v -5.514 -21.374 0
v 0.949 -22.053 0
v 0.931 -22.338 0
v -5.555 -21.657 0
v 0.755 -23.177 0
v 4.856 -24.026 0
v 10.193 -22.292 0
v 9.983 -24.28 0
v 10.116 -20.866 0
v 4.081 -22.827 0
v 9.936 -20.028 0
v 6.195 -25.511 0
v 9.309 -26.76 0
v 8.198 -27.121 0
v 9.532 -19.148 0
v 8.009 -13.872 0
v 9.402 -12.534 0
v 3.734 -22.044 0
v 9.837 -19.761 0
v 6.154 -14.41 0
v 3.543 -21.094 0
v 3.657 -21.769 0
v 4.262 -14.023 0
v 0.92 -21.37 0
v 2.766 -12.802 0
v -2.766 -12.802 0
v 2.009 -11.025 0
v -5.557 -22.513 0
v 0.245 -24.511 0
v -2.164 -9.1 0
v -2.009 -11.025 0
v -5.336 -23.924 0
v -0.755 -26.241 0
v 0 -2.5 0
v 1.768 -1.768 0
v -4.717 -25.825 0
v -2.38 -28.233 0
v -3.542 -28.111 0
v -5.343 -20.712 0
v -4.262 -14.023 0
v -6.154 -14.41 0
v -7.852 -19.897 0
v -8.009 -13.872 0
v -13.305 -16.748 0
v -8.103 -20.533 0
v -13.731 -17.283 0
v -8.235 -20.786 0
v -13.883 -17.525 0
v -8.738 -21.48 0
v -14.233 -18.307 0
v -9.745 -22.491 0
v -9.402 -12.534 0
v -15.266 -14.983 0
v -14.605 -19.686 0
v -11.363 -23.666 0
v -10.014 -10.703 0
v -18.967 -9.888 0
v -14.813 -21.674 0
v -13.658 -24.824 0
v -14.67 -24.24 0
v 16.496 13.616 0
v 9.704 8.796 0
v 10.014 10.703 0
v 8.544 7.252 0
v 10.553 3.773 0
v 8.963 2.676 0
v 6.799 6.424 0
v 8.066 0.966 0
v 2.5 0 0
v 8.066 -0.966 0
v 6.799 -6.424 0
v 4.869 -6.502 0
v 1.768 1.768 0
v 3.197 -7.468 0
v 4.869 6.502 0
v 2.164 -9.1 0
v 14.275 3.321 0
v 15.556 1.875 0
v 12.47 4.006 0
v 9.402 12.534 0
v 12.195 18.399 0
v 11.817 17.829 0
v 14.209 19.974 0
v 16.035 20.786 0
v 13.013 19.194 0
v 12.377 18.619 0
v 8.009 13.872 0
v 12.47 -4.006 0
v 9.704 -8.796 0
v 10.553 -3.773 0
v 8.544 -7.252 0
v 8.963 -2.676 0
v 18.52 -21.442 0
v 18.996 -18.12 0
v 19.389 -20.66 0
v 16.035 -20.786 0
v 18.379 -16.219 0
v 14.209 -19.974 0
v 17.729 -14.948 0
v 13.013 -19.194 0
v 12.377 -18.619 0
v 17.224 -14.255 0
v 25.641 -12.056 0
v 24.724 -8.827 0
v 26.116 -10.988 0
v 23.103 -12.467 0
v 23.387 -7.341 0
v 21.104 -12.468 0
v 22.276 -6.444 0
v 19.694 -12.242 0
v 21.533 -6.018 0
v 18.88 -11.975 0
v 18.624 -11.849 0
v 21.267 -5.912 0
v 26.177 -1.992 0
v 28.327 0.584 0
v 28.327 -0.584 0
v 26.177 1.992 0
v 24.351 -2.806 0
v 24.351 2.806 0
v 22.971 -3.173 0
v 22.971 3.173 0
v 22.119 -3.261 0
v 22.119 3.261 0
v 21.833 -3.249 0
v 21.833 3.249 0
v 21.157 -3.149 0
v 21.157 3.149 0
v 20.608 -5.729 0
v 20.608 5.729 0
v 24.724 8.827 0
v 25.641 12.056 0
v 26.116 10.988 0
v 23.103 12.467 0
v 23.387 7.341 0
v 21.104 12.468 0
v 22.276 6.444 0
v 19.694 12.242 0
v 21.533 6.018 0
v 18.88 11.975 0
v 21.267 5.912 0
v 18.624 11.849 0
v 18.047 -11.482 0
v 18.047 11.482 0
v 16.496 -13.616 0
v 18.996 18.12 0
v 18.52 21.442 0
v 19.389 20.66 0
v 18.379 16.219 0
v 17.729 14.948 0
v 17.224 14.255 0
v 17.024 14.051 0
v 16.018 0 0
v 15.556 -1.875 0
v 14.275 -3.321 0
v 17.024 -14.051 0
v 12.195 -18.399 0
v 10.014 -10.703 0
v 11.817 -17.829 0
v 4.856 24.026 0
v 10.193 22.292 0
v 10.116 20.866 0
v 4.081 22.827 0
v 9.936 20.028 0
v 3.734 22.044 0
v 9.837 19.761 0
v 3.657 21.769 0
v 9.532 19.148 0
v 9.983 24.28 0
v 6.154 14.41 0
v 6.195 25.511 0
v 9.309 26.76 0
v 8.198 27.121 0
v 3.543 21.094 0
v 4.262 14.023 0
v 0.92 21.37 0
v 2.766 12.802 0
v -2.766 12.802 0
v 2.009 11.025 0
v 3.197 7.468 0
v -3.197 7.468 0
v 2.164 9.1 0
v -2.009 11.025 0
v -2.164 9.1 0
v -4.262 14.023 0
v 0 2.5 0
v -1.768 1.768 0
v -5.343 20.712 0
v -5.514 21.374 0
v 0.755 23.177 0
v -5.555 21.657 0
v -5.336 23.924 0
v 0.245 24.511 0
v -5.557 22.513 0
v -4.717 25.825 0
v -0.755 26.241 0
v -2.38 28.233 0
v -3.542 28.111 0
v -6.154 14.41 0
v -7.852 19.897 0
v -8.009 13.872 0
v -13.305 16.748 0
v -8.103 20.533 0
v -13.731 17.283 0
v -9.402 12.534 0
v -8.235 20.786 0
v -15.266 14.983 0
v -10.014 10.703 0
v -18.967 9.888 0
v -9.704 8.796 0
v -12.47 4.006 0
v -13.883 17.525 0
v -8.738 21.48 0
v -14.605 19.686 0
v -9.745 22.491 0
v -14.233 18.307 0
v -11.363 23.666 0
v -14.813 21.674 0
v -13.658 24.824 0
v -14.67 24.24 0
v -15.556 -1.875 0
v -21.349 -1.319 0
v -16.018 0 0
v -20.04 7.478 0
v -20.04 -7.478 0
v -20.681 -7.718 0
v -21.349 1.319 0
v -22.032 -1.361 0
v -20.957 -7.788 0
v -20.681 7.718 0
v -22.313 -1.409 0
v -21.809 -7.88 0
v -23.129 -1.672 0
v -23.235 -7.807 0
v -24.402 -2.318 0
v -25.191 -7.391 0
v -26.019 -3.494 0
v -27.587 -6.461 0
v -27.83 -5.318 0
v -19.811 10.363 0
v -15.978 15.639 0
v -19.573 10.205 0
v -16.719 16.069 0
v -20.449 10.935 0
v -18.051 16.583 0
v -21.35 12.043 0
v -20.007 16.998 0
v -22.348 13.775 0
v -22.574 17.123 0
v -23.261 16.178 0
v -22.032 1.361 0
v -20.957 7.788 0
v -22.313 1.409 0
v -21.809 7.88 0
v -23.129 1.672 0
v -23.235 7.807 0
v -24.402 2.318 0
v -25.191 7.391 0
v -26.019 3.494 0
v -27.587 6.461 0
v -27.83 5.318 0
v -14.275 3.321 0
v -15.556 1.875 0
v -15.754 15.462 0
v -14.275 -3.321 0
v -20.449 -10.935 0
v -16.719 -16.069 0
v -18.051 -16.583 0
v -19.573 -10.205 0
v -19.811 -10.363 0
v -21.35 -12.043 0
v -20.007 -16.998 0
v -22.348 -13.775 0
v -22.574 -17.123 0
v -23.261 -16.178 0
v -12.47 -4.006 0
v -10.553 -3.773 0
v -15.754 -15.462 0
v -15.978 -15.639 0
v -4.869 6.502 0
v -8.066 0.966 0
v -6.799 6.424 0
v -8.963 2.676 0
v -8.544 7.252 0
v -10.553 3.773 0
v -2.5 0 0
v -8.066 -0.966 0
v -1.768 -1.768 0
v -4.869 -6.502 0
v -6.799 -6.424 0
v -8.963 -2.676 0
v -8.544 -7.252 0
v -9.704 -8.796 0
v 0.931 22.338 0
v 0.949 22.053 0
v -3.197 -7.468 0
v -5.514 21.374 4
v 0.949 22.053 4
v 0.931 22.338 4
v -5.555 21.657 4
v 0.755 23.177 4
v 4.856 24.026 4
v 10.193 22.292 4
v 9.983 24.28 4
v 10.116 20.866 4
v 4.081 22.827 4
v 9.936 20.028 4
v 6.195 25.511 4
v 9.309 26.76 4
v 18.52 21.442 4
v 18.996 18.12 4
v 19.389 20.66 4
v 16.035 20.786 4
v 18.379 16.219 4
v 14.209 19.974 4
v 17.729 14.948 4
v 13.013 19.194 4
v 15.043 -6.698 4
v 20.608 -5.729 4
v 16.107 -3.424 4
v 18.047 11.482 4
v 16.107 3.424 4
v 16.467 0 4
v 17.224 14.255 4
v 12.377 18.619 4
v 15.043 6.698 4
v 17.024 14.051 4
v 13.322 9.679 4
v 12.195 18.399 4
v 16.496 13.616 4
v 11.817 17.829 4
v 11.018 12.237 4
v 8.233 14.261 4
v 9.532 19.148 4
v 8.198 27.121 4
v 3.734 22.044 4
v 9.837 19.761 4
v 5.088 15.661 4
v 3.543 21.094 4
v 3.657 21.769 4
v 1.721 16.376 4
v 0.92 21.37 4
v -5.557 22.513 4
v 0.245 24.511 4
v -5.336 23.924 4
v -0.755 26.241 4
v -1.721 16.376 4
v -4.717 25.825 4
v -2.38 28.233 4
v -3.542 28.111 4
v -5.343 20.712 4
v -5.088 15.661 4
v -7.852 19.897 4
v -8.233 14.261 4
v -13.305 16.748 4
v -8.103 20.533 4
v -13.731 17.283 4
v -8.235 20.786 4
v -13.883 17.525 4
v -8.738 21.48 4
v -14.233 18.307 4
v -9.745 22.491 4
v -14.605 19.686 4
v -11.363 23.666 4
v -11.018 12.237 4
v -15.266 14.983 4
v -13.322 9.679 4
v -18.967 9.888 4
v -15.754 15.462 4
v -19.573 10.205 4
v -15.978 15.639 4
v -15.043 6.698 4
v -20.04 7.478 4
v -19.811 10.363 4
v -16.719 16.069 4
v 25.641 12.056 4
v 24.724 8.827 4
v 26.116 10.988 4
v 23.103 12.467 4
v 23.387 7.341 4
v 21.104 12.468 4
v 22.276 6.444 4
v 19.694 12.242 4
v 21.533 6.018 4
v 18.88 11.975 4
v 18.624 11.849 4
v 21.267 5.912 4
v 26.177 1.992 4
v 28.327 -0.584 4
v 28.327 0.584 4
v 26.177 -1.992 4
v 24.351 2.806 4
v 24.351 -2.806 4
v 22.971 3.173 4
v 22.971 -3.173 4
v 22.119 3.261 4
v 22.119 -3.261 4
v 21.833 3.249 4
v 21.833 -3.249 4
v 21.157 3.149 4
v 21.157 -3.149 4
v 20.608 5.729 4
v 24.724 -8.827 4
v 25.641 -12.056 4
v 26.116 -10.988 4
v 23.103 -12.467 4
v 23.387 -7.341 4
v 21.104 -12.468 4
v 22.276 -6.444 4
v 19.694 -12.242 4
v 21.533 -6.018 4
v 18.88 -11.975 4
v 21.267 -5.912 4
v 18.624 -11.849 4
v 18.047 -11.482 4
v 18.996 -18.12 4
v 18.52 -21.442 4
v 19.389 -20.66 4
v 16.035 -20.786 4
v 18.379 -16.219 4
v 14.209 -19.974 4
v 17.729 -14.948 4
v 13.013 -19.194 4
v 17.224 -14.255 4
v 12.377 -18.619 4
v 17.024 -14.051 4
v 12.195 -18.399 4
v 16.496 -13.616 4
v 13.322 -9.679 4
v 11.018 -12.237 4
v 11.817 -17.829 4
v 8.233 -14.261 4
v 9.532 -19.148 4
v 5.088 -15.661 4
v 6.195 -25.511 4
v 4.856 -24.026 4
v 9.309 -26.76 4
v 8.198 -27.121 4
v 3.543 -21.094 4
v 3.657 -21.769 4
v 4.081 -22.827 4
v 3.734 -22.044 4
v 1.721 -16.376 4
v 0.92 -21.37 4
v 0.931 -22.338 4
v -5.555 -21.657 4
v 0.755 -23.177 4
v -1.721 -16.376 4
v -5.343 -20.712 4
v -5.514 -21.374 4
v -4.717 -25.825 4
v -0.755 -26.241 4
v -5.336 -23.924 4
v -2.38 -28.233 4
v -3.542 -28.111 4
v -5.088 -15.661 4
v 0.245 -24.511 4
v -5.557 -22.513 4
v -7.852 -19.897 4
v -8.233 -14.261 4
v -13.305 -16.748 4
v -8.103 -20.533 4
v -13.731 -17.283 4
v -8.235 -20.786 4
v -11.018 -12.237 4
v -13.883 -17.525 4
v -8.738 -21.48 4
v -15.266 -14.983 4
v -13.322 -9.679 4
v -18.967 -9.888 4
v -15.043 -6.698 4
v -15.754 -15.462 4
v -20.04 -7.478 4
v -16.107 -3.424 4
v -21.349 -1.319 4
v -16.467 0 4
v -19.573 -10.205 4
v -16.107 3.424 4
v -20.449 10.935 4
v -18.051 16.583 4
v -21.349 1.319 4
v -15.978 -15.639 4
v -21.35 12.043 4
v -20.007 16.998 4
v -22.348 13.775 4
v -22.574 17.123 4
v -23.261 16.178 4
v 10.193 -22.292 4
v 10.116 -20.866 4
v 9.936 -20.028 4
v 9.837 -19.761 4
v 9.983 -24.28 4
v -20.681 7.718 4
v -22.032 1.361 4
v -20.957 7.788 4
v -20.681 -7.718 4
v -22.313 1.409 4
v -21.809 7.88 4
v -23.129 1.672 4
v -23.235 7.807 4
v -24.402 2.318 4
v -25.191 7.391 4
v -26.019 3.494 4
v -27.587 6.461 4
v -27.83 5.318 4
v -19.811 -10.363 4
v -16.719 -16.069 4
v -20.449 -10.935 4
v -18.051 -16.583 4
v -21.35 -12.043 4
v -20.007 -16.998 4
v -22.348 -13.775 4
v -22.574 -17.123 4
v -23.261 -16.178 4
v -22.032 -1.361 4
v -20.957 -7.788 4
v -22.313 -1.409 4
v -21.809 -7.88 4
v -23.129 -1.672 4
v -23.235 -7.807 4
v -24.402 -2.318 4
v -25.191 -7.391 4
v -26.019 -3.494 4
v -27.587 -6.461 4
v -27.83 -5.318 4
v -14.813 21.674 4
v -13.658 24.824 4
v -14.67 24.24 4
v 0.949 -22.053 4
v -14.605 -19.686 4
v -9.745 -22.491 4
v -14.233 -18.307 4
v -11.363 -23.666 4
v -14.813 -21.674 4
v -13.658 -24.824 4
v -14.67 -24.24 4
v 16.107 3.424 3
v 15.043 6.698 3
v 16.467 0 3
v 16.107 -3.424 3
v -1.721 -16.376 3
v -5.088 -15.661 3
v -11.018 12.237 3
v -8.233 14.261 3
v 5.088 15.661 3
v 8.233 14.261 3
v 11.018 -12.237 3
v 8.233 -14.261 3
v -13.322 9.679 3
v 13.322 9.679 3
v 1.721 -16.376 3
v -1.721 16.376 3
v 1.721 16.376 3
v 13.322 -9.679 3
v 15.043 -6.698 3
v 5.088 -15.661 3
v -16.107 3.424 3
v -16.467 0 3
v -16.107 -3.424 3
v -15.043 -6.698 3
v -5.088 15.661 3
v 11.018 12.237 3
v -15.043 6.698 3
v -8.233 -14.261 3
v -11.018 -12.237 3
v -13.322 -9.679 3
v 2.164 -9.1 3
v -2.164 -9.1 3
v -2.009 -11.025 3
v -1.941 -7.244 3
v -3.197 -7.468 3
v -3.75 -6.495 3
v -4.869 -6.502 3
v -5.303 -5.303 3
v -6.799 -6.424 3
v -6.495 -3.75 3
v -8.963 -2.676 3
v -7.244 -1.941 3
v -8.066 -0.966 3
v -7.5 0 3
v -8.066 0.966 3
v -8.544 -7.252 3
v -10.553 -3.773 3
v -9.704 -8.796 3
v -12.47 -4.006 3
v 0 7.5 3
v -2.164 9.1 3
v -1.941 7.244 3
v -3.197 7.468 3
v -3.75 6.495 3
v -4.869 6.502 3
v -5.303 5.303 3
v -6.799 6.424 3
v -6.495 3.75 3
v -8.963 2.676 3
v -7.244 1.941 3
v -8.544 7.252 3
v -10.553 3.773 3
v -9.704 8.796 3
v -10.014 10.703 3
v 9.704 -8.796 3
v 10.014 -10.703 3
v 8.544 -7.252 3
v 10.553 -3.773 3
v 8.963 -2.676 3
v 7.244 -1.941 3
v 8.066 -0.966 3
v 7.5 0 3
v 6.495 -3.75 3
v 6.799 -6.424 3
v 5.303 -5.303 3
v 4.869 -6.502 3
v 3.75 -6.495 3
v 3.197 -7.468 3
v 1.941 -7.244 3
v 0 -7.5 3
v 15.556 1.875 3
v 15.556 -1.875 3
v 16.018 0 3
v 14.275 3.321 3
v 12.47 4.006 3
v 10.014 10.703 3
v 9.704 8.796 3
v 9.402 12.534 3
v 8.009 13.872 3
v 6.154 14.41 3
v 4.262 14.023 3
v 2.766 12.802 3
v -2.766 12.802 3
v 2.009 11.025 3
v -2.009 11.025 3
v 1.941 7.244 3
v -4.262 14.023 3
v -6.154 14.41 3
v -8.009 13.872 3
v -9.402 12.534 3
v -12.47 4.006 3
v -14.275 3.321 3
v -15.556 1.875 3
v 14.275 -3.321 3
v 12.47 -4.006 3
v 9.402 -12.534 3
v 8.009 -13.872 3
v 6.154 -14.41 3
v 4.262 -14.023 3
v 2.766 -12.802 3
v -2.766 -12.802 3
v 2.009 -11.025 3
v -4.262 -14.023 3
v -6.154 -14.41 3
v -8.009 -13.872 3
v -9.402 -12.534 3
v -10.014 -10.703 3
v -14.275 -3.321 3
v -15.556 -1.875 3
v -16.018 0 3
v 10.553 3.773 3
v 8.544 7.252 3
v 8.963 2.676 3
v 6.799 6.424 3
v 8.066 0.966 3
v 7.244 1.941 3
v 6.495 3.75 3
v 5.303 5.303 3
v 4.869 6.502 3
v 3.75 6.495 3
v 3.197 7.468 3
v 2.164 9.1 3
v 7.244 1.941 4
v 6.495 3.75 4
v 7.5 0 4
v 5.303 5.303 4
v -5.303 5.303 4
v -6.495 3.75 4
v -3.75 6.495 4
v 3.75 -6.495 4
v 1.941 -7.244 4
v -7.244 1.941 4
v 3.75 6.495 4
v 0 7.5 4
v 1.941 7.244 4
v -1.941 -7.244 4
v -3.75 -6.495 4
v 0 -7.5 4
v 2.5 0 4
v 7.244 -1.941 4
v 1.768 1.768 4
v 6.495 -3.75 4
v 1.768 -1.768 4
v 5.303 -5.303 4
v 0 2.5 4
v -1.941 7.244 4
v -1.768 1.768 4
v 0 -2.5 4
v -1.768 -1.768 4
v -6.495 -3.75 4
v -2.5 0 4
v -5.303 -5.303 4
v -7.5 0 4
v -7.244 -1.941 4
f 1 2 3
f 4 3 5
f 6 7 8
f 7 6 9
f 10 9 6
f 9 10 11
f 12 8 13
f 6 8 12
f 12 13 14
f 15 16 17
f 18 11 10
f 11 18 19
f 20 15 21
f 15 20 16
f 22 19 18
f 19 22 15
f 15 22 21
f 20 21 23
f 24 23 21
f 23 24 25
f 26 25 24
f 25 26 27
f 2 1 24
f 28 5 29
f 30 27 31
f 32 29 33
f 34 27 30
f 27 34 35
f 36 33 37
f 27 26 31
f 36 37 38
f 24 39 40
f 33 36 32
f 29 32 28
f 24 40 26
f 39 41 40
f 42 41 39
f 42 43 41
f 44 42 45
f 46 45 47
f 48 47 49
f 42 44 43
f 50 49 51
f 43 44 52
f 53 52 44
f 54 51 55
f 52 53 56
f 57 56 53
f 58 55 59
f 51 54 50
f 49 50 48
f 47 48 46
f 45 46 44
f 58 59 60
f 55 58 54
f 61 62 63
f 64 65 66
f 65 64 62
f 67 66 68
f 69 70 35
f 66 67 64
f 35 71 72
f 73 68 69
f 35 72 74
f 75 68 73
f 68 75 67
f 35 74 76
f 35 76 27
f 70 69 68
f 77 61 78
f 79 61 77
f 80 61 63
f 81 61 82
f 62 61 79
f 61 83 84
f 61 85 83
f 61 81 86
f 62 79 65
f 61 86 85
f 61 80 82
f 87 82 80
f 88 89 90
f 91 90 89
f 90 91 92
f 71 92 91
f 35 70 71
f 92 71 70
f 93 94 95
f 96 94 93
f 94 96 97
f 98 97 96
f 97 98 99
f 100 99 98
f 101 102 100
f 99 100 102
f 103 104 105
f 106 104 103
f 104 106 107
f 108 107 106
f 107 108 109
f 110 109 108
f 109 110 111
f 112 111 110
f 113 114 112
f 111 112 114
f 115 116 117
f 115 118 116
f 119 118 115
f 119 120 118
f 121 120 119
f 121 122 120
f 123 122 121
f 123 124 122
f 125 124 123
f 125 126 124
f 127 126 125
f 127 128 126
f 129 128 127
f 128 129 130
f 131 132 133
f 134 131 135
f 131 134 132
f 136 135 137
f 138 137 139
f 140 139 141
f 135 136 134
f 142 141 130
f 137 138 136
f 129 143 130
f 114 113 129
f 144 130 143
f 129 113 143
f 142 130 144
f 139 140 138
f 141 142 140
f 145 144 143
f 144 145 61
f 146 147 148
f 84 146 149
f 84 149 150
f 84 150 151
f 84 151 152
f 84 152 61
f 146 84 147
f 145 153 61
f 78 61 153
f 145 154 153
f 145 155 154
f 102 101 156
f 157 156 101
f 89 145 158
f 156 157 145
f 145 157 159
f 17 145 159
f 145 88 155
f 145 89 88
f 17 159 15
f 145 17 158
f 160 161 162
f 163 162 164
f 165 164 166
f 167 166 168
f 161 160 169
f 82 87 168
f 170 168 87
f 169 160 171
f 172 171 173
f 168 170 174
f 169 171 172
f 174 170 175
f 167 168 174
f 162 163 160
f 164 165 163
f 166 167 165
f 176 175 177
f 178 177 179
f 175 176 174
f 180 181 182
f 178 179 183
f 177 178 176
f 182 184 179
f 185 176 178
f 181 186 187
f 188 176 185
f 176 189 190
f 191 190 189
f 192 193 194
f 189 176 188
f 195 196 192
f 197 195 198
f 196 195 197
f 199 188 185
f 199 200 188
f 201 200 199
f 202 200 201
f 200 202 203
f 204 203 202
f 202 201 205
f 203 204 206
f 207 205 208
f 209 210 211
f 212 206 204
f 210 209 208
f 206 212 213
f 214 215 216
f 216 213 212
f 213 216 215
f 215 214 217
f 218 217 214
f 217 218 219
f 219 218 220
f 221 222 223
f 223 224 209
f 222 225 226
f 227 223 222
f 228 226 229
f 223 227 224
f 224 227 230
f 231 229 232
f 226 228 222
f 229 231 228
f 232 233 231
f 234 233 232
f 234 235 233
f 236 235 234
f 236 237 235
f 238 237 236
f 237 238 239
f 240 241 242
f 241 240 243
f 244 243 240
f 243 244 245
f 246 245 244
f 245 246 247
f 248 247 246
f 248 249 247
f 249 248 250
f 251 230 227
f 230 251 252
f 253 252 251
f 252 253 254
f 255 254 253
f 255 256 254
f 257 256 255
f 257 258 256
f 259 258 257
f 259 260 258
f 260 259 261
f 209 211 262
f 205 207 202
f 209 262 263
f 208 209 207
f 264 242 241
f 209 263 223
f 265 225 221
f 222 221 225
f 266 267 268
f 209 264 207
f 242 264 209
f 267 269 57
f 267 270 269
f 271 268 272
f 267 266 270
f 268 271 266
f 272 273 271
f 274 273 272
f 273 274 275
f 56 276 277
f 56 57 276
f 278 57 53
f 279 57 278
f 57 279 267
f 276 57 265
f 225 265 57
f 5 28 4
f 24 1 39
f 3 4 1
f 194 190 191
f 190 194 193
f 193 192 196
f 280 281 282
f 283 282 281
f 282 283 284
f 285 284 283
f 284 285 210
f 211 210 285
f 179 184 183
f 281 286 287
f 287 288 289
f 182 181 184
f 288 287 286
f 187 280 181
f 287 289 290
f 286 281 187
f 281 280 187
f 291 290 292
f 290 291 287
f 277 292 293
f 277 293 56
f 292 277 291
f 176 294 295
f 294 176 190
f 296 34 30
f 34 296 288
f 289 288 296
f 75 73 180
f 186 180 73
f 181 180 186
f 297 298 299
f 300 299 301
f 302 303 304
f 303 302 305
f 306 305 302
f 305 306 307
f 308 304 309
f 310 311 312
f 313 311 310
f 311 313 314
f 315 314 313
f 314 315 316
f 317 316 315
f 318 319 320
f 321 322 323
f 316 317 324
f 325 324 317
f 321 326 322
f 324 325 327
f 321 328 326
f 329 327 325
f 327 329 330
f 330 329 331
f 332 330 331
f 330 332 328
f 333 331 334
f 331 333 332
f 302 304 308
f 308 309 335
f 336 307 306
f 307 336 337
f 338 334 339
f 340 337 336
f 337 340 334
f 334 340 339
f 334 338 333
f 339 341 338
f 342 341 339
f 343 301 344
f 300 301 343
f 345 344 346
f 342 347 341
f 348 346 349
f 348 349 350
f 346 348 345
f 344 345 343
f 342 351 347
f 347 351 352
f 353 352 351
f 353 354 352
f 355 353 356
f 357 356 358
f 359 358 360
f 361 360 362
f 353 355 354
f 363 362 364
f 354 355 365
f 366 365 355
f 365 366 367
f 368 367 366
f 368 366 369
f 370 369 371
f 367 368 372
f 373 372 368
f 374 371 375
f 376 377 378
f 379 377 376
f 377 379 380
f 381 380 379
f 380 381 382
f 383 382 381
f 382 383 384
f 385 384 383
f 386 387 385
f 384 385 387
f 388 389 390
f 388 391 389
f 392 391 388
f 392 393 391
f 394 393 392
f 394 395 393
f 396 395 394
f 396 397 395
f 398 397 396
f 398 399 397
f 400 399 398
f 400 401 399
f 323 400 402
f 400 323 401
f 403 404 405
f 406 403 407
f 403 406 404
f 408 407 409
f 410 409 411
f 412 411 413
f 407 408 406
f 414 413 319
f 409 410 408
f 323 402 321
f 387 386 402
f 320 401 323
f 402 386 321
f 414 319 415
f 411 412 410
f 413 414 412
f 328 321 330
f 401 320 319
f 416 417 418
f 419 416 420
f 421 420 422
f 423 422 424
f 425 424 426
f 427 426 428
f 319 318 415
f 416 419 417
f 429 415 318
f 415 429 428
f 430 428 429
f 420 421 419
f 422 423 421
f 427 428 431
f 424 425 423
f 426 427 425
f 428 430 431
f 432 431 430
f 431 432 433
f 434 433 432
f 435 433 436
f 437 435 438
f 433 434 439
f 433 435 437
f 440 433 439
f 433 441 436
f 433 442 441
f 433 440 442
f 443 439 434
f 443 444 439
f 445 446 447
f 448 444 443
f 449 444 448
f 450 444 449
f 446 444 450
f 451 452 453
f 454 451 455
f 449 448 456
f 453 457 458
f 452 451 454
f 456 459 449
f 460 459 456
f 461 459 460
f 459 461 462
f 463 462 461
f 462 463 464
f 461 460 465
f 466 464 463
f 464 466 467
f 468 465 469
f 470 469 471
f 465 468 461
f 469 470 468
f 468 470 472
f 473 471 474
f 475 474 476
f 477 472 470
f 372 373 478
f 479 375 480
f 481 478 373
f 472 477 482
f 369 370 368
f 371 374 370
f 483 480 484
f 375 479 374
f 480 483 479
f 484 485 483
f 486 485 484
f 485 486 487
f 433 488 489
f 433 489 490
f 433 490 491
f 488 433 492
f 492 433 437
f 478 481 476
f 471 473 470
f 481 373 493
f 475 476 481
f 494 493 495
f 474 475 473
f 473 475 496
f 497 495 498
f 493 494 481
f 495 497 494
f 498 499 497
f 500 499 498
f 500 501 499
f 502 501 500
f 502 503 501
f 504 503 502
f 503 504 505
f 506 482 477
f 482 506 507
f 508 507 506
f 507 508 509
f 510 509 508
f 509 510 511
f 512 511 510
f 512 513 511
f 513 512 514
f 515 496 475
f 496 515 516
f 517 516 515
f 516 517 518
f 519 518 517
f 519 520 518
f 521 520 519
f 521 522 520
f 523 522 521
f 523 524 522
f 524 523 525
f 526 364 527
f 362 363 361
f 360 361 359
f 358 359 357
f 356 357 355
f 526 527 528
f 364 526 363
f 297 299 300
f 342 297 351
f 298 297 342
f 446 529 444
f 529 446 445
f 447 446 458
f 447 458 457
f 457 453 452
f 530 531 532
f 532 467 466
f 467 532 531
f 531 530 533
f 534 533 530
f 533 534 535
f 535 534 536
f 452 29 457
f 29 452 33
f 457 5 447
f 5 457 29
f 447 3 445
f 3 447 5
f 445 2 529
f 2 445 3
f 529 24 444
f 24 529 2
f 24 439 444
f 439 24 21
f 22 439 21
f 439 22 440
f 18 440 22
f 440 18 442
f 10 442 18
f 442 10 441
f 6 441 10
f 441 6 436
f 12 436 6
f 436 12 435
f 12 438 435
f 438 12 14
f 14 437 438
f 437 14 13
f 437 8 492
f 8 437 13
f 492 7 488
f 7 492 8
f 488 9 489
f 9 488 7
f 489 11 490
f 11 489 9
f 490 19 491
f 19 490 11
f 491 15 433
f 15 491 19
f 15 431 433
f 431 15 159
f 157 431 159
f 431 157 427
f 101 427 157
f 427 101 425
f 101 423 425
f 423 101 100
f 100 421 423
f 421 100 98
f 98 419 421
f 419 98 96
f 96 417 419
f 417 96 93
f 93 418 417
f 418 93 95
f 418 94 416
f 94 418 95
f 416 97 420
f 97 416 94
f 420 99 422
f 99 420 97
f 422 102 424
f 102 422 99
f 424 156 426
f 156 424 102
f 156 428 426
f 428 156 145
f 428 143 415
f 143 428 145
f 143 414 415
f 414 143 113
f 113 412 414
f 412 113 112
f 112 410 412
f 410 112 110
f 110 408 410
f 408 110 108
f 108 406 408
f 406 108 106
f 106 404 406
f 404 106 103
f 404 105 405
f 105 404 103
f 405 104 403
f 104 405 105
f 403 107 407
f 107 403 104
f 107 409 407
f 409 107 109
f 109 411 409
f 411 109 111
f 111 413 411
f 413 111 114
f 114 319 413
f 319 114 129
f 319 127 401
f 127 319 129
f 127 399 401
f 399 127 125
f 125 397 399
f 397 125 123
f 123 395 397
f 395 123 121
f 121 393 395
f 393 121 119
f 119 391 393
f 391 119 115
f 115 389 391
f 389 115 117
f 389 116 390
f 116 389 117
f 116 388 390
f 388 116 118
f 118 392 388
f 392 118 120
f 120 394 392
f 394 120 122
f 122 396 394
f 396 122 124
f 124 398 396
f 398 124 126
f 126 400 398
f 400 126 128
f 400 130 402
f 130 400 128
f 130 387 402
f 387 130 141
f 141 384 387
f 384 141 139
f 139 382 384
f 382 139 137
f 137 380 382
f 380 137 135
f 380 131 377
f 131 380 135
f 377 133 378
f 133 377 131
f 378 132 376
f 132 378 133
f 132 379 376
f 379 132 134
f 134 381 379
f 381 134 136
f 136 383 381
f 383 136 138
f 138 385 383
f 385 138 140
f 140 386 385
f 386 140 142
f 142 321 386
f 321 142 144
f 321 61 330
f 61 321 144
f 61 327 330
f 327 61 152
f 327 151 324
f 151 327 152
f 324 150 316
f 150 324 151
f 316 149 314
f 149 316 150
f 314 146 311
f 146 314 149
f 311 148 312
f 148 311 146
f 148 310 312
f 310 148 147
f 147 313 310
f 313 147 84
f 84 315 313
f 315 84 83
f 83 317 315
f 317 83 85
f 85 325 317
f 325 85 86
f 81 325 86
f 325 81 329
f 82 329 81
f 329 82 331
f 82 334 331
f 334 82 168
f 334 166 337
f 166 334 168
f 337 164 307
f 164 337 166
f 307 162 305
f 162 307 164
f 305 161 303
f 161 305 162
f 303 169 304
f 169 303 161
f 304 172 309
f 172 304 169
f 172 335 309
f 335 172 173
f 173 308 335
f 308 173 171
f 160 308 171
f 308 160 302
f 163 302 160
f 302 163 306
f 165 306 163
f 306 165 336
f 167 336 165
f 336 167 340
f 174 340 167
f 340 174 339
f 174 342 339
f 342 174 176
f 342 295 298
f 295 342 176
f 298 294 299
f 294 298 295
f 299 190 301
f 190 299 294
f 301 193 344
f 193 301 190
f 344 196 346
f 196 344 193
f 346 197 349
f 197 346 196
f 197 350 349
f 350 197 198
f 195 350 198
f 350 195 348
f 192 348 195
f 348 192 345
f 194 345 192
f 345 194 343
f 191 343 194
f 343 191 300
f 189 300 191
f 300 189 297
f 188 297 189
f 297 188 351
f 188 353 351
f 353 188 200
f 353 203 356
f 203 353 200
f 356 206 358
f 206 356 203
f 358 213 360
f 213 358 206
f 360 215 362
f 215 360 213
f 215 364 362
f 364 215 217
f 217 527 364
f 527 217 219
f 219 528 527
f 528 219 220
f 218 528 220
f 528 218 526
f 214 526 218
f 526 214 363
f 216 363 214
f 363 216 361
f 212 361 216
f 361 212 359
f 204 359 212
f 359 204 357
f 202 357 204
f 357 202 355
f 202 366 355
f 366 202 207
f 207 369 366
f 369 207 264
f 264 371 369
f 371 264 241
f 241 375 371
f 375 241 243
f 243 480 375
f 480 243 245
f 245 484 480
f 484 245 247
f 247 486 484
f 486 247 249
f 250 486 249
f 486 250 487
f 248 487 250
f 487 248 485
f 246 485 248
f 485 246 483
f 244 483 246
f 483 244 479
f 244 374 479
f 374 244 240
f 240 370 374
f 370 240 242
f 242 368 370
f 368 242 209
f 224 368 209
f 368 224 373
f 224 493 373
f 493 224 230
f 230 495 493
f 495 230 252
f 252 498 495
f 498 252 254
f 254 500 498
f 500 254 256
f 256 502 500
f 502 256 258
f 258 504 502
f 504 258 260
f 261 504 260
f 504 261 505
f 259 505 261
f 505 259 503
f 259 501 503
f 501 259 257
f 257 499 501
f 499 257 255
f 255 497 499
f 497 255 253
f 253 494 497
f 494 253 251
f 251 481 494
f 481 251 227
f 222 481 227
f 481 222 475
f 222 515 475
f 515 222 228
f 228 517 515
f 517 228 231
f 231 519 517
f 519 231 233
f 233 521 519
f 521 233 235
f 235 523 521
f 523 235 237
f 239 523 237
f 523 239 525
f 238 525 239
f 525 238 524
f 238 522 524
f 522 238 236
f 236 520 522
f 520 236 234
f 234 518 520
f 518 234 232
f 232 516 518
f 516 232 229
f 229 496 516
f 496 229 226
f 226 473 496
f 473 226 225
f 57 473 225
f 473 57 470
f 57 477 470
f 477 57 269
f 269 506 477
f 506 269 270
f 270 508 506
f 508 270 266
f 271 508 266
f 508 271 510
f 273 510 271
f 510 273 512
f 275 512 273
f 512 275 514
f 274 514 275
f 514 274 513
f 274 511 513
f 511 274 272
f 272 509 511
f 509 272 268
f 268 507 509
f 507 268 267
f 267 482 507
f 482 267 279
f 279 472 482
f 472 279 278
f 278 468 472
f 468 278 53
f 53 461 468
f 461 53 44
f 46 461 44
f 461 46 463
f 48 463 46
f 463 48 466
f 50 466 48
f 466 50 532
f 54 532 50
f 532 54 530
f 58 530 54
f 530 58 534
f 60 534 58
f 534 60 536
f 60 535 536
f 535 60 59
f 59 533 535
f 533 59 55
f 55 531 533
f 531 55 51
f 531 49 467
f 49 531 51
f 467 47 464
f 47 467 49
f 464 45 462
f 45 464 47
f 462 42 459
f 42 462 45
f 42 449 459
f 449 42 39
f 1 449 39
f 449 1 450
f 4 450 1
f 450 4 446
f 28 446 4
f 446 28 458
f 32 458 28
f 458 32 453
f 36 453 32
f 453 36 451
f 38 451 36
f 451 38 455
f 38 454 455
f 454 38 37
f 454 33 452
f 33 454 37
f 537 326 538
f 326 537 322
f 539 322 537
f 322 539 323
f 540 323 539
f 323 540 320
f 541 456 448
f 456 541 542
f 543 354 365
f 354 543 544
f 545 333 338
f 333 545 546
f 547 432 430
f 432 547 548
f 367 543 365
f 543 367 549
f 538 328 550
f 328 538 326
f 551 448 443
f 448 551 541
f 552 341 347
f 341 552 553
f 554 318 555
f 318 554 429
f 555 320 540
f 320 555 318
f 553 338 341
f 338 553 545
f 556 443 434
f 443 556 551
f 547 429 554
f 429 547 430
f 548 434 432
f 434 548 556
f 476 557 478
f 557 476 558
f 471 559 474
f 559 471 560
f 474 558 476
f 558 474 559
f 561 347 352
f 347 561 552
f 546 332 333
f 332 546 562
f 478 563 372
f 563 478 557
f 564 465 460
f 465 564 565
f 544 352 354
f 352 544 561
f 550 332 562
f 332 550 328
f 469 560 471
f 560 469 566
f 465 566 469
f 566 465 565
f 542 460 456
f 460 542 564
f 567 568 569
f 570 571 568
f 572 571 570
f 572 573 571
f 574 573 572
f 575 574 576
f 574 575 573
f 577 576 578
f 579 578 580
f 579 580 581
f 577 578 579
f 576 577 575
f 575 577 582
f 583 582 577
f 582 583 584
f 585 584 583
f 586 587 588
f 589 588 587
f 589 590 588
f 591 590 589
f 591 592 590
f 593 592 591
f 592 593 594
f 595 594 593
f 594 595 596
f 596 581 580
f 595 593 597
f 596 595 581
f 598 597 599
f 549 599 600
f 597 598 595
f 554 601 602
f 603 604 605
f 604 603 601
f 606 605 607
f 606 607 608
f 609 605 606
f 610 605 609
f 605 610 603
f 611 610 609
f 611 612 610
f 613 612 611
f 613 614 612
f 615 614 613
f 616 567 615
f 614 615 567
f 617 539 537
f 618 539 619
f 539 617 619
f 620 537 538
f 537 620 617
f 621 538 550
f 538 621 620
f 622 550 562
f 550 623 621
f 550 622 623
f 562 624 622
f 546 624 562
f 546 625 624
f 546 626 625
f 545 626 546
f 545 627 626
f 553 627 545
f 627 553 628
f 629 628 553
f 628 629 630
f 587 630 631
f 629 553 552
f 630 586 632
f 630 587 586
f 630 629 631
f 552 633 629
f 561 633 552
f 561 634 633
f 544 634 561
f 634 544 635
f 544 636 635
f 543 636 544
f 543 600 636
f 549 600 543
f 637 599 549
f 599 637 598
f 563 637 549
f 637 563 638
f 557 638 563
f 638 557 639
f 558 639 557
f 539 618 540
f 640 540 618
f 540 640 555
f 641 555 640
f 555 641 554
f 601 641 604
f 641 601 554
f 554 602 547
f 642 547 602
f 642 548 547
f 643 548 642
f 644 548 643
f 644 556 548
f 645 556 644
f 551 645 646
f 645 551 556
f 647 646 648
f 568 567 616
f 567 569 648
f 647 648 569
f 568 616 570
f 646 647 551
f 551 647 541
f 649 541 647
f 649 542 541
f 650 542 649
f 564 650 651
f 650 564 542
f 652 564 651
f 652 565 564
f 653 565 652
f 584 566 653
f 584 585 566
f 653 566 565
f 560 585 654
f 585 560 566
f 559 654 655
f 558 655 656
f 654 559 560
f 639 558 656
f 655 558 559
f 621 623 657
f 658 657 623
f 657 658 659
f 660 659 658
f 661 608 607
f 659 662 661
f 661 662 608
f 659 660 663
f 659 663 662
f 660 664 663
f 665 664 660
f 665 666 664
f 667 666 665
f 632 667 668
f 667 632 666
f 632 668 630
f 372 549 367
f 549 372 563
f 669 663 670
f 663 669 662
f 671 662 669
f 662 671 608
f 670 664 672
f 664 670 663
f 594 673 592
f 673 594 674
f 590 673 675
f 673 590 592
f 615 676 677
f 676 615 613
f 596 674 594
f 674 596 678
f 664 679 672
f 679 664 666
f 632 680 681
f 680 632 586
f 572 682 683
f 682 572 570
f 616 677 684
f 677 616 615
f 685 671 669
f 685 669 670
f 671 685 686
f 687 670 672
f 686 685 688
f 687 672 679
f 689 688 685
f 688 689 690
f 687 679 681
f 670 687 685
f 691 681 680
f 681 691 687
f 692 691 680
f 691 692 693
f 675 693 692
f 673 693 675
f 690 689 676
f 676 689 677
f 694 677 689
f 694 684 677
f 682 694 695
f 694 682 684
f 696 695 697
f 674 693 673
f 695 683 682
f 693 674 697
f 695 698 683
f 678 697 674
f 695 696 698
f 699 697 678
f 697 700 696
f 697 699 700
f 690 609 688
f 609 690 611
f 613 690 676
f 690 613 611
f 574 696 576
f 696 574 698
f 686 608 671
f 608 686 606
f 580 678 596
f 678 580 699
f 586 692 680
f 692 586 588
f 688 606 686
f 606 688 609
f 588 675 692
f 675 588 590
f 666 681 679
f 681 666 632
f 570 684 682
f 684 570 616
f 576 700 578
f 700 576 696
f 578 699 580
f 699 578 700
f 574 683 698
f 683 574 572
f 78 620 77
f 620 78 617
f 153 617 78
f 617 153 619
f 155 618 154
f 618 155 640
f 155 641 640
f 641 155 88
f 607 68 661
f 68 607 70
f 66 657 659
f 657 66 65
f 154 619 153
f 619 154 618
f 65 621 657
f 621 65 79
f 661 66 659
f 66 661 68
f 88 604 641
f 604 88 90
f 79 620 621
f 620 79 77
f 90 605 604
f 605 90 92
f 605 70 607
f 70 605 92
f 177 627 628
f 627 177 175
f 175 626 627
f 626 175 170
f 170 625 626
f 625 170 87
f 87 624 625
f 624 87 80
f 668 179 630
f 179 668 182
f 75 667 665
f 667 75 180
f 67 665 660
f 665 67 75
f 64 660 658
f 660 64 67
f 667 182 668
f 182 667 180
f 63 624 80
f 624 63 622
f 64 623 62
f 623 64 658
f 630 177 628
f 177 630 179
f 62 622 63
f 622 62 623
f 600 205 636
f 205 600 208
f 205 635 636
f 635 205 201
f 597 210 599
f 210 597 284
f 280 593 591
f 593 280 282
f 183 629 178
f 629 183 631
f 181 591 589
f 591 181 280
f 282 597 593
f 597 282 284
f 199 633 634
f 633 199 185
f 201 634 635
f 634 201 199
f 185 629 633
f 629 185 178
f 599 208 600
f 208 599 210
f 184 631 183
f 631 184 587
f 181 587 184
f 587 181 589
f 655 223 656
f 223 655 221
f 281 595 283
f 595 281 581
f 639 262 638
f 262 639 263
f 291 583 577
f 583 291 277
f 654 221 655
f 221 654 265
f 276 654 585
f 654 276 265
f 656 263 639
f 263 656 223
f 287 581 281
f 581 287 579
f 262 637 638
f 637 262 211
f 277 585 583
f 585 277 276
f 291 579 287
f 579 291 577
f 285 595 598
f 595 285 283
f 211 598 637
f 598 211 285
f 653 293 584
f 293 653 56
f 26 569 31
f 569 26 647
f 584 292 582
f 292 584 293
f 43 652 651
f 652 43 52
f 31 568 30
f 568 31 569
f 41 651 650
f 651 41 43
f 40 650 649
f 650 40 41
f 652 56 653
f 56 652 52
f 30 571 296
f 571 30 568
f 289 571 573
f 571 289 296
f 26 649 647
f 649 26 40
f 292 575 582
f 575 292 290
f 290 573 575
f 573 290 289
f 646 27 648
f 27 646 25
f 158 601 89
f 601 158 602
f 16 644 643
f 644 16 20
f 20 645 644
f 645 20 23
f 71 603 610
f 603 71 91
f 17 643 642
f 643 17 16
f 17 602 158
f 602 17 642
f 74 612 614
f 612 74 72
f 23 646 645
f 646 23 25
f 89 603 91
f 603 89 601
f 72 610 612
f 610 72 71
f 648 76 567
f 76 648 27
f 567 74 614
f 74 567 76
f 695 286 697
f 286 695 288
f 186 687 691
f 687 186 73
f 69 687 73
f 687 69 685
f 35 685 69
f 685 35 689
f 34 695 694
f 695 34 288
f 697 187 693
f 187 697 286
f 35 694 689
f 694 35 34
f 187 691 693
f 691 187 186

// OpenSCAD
// Parametric Involute Bevel and Spur Gears by GregFrost
// It is licensed under the Creative Commons - GNU GPL license.
// © 2010 by GregFrost
// http://www.thingiverse.com/thing:3575

// Simple Test:
gear (circular_pitch=600,
	gear_thickness = 3,
	rim_thickness = 4,
	hub_thickness = 4,
	circles=6);

//Complex Spur Gear Test:
//test_gears ();

// Meshing Double Helix:
//meshing_double_helix ();

// Demonstrate the backlash option for Spur gears.
//test_backlash ();

// Demonstrate how to make meshing bevel gears.
//bevel_gear_pair ();

pi=3.1415926535897932384626433832795;

//==================================================
// Bevel Gears:
// Two gears with the same cone distance, circular pitch (measured at the cone distance) 
// and pressure angle will mesh.

module bevel_gear_pair (
	gear1_teeth = 41,
	gear2_teeth = 7,
	axis_angle = 90,
	outside_circular_pitch=1000)
{
	outside_pitch_radius1 = gear1_teeth * outside_circular_pitch / 360;
	outside_pitch_radius2 = gear2_teeth * outside_circular_pitch / 360;
	pitch_apex1=outside_pitch_radius2 * sin (axis_angle) + 
		(outside_pitch_radius2 * cos (axis_angle) + outside_pitch_radius1) / tan (axis_angle);
	cone_distance = sqrt (pow (pitch_apex1, 2) + pow (outside_pitch_radius1, 2));
	pitch_apex2 = sqrt (pow (cone_distance, 2) - pow (outside_pitch_radius2, 2));
	echo ("cone_distance", cone_distance);
	pitch_angle1 = asin (outside_pitch_radius1 / cone_distance);
	pitch_angle2 = asin (outside_pitch_radius2 / cone_distance);
	echo ("pitch_angle1, pitch_angle2", pitch_angle1, pitch_angle2);
	echo ("pitch_angle1 + pitch_angle2", pitch_angle1 + pitch_angle2);

	rotate([0,0,90])
	translate ([0,0,pitch_apex1+20])
	{
		translate([0,0,-pitch_apex1])
		bevel_gear (
			number_of_teeth=gear1_teeth,
			cone_distance=cone_distance,
			pressure_angle=30,
			outside_circular_pitch=outside_circular_pitch);
	
		rotate([0,-(pitch_angle1+pitch_angle2),0])
		translate([0,0,-pitch_apex2])
		bevel_gear (
			number_of_teeth=gear2_teeth,
			cone_distance=cone_distance,
			pressure_angle=30,
			outside_circular_pitch=outside_circular_pitch);
	}
}

//Bevel Gear Finishing Options:
bevel_gear_flat = 0;
bevel_gear_back_cone = 1;

module bevel_gear (
	number_of_teeth=11,
	cone_distance=100,
	face_width=20,
	outside_circular_pitch=1000,
	pressure_angle=30,
	clearance = 0.2,
	bore_diameter=5,
	gear_thickness = 15,
	backlash = 0,
	involute_facets=0,
	finish = -1)
{
	echo ("bevel_gear",
		"teeth", number_of_teeth,
		"cone distance", cone_distance,
		face_width,
		outside_circular_pitch,
		pressure_angle,
		clearance,
		bore_diameter,
		involute_facets,
		finish);

	// Pitch diameter: Diameter of pitch circle at the fat end of the gear.
	outside_pitch_diameter  =  number_of_teeth * outside_circular_pitch / 180;
	outside_pitch_radius = outside_pitch_diameter / 2;

	// The height of the pitch apex.
	pitch_apex = sqrt (pow (cone_distance, 2) - pow (outside_pitch_radius, 2));
	pitch_angle = asin (outside_pitch_radius/cone_distance);

	echo ("Num Teeth:", number_of_teeth, " Pitch Angle:", pitch_angle);

	finish = (finish != -1) ? finish : (pitch_angle < 45) ? bevel_gear_flat : bevel_gear_back_cone;

	apex_to_apex=cone_distance / cos (pitch_angle);
	back_cone_radius = apex_to_apex * sin (pitch_angle);

	// Calculate and display the pitch angle. This is needed to determine the angle to mount two meshing cone gears.

	// Base Circle for forming the involute teeth shape.
	base_radius = back_cone_radius * cos (pressure_angle);	

	// Diametrial pitch: Number of teeth per unit length.
	pitch_diametrial = number_of_teeth / outside_pitch_diameter;

	// Addendum: Radial distance from pitch circle to outside circle.
	addendum = 1 / pitch_diametrial;
	// Outer Circle
	outer_radius = back_cone_radius + addendum;

	// Dedendum: Radial distance from pitch circle to root diameter
	dedendum = addendum + clearance;
	dedendum_angle = atan (dedendum / cone_distance);
	root_angle = pitch_angle - dedendum_angle;

	root_cone_full_radius = tan (root_angle)*apex_to_apex;
	back_cone_full_radius=apex_to_apex / tan (pitch_angle);

	back_cone_end_radius = 
		outside_pitch_radius - 
		dedendum * cos (pitch_angle) - 
		gear_thickness / tan (pitch_angle);
	back_cone_descent = dedendum * sin (pitch_angle) + gear_thickness;

	// Root diameter: Diameter of bottom of tooth spaces.
	root_radius = back_cone_radius - dedendum;

	half_tooth_thickness = outside_pitch_radius * sin (360 / (4 * number_of_teeth)) - backlash / 4;
	half_thick_angle = asin (half_tooth_thickness / back_cone_radius);

	face_cone_height = apex_to_apex-face_width / cos (pitch_angle);
	face_cone_full_radius = face_cone_height / tan (pitch_angle);
	face_cone_descent = dedendum * sin (pitch_angle);
	face_cone_end_radius = 
		outside_pitch_radius -
		face_width / sin (pitch_angle) - 
		face_cone_descent / tan (pitch_angle);

	// For the bevel_gear_flat finish option, calculate the height of a cube to select the portion of the gear that includes the full pitch face.
	bevel_gear_flat_height = pitch_apex - (cone_distance - face_width) * cos (pitch_angle);

//	translate([0,0,-pitch_apex])
	difference ()
	{
		intersection ()
		{
			union()
			{
				rotate (half_thick_angle)
				translate ([0,0,pitch_apex-apex_to_apex])
				cylinder ($fn=number_of_teeth*2, r1=root_cone_full_radius,r2=0,h=apex_to_apex);
				for (i = [1:number_of_teeth])
//				for (i = [1:1])
				{
					rotate ([0,0,i*360/number_of_teeth])
					{
						involute_bevel_gear_tooth (
							back_cone_radius = back_cone_radius,
							root_radius = root_radius,
							base_radius = base_radius,
							outer_radius = outer_radius,
							pitch_apex = pitch_apex,
							cone_distance = cone_distance,
							half_thick_angle = half_thick_angle,
							involute_facets = involute_facets);
					}
				}
			}

			if (finish == bevel_gear_back_cone)
			{
				translate ([0,0,-back_cone_descent])
				cylinder (
					$fn=number_of_teeth*2, 
					r1=back_cone_end_radius,
					r2=back_cone_full_radius*2,
					h=apex_to_apex + back_cone_descent);
			}
			else
			{
				translate ([-1.5*outside_pitch_radius,-1.5*outside_pitch_radius,0])
				cube ([3*outside_pitch_radius,
					3*outside_pitch_radius,
					bevel_gear_flat_height]);
			}
		}
		
		if (finish == bevel_gear_back_cone)
		{
			translate ([0,0,-face_cone_descent])
			cylinder (
				r1=face_cone_end_radius,
				r2=face_cone_full_radius * 2,
				h=face_cone_height + face_cone_descent+pitch_apex);
		}

		translate ([0,0,pitch_apex - apex_to_apex])
		cylinder (r=bore_diameter/2,h=apex_to_apex);
	}	
}

module involute_bevel_gear_tooth (
	back_cone_radius,
	root_radius,
	base_radius,
	outer_radius,
	pitch_apex,
	cone_distance,
	half_thick_angle,
	involute_facets)
{
//	echo ("involute_bevel_gear_tooth",
//		back_cone_radius,
//		root_radius,
//		base_radius,
//		outer_radius,
//		pitch_apex,
//		cone_distance,
//		half_thick_angle);

	min_radius = max (base_radius*2,root_radius*2);

	pitch_point = 
		involute (
			base_radius*2, 
			involute_intersect_angle (base_radius*2, back_cone_radius*2));
	pitch_angle = atan2 (pitch_point[1], pitch_point[0]);
	centre_angle = pitch_angle + half_thick_angle;

	start_angle = involute_intersect_angle (base_radius*2, min_radius);
	stop_angle = involute_intersect_angle (base_radius*2, outer_radius*2);

	res=(involute_facets!=0)?involute_facets:($fn==0)?5:$fn/4;

	translate ([0,0,pitch_apex])
	rotate ([0,-atan(back_cone_radius/cone_distance),0])
	translate ([-back_cone_radius*2,0,-cone_distance*2])
	union ()
	{
		for (i=[1:res])
		{
			assign (
				point1=
					involute (base_radius*2,start_angle+(stop_angle - start_angle)*(i-1)/res),
				point2=
					involute (base_radius*2,start_angle+(stop_angle - start_angle)*(i)/res))
			{
				assign (
					side1_point1 = rotate_point (centre_angle, point1),
					side1_point2 = rotate_point (centre_angle, point2),
					side2_point1 = mirror_point (rotate_point (centre_angle, point1)),
					side2_point2 = mirror_point (rotate_point (centre_angle, point2)))
				{
					polyhedron (
						points=[
							[back_cone_radius*2+0.1,0,cone_distance*2],
							[side1_point1[0],side1_point1[1],0],
							[side1_point2[0],side1_point2[1],0],
							[side2_point2[0],side2_point2[1],0],
							[side2_point1[0],side2_point1[1],0],
							[0.1,0,0]],
						triangles=[[0,1,2],[0,2,3],[0,3,4],[0,5,1],[1,5,2],[2,5,3],[3,5,4],[0,4,5]]);
				}
			}
		}
	}
}

module gear (
	number_of_teeth=15,
	circular_pitch=false, diametral_pitch=false,
	pressure_angle=28,
	clearance = 0.2,
	gear_thickness=5,
	rim_thickness=8,
	rim_width=5,
	hub_thickness=10,
	hub_diameter=15,
	bore_diameter=5,
	circles=0,
	backlash=0,
	twist=0,
	involute_facets=0)
{
	if (circular_pitch==false && diametral_pitch==false) 
		echo("MCAD ERROR: gear module needs either a diametral_pitch or circular_pitch");

	//Convert diametrial pitch to our native circular pitch
	circular_pitch = (circular_pitch!=false?circular_pitch:180/diametral_pitch);

	// Pitch diameter: Diameter of pitch circle.
	pitch_diameter  =  number_of_teeth * circular_pitch / 180;
	pitch_radius = pitch_diameter/2;
	echo ("Teeth:", number_of_teeth, " Pitch radius:", pitch_radius);

	// Base Circle
	base_radius = pitch_radius*cos(pressure_angle);

	// Diametrial pitch: Number of teeth per unit length.
	pitch_diametrial = number_of_teeth / pitch_diameter;

	// Addendum: Radial distance from pitch circle to outside circle.
	addendum = 1/pitch_diametrial;

	//Outer Circle
	outer_radius = pitch_radius+addendum;

	// Dedendum: Radial distance from pitch circle to root diameter
	dedendum = addendum + clearance;

	// Root diameter: Diameter of bottom of tooth spaces.
	root_radius = pitch_radius-dedendum;
	backlash_angle = backlash / pitch_radius * 180 / pi;
	half_thick_angle = (360 / number_of_teeth - backlash_angle) / 4;

	// Variables controlling the rim.
	rim_radius = root_radius - rim_width;

	// Variables controlling the circular holes in the gear.
	circle_orbit_diameter=hub_diameter/2+rim_radius;
	circle_orbit_curcumference=pi*circle_orbit_diameter;

	// Limit the circle size to 90% of the gear face.
	circle_diameter=
		min (
			0.70*circle_orbit_curcumference/circles,
			(rim_radius-hub_diameter/2)*0.9);

	difference ()
	{
		union ()
		{
			difference ()
			{
				linear_extrude (height=rim_thickness, convexity=10, twist=twist)
				gear_shape (
					number_of_teeth,
					pitch_radius = pitch_radius,
					root_radius = root_radius,
					base_radius = base_radius,
					outer_radius = outer_radius,
					half_thick_angle = half_thick_angle,
					involute_facets=involute_facets);

				if (gear_thickness < rim_thickness)
					translate ([0,0,gear_thickness])
					cylinder (r=rim_radius,h=rim_thickness-gear_thickness+1);
			}
			if (gear_thickness > rim_thickness)
				cylinder (r=rim_radius,h=gear_thickness);
			if (hub_thickness > gear_thickness)
				translate ([0,0,gear_thickness])
				cylinder (r=hub_diameter/2,h=hub_thickness-gear_thickness);
		}
		translate ([0,0,-1])
		cylinder (
			r=bore_diameter/2,
			h=2+max(rim_thickness,hub_thickness,gear_thickness));
		if (circles>0)
		{
			for(i=[0:circles-1])	
				rotate([0,0,i*360/circles])
				translate([circle_orbit_diameter/2,0,-1])
				cylinder(r=circle_diameter/2,h=max(gear_thickness,rim_thickness)+3);
		}
	}
}

module gear_shape (
	number_of_teeth,
	pitch_radius,
	root_radius,
	base_radius,
	outer_radius,
	half_thick_angle,
	involute_facets)
{
	union()
	{
		rotate (half_thick_angle) circle ($fn=number_of_teeth*2, r=root_radius);

		for (i = [1:number_of_teeth])
		{
			rotate ([0,0,i*360/number_of_teeth])
			{
				involute_gear_tooth (
					pitch_radius = pitch_radius,
					root_radius = root_radius,
					base_radius = base_radius,
					outer_radius = outer_radius,
					half_thick_angle = half_thick_angle,
					involute_facets=involute_facets);
			}
		}
	}
}

module involute_gear_tooth (
	pitch_radius,
	root_radius,
	base_radius,
	outer_radius,
	half_thick_angle,
	involute_facets)
{
	min_radius = max (base_radius,root_radius);

	pitch_point = involute (base_radius, involute_intersect_angle (base_radius, pitch_radius));
	pitch_angle = atan2 (pitch_point[1], pitch_point[0]);
	centre_angle = pitch_angle + half_thick_angle;

	start_angle = involute_intersect_angle (base_radius, min_radius);
	stop_angle = involute_intersect_angle (base_radius, outer_radius);

	res=(involute_facets!=0)?involute_facets:($fn==0)?5:$fn/4;

	union ()
	{
		for (i=[1:res])
		assign (
			point1=involute (base_radius,start_angle+(stop_angle - start_angle)*(i-1)/res),
			point2=involute (base_radius,start_angle+(stop_angle - start_angle)*i/res))
		{
			assign (
				side1_point1=rotate_point (centre_angle, point1),
				side1_point2=rotate_point (centre_angle, point2),
				side2_point1=mirror_point (rotate_point (centre_angle, point1)),
				side2_point2=mirror_point (rotate_point (centre_angle, point2)))
			{
				polygon (
					points=[[0,0],side1_point1,side1_point2,side2_point2,side2_point1],
					paths=[[0,1,2,3,4,0]]);
			}
		}
	}
}

// Mathematical Functions
//===============

// Finds the angle of the involute about the base radius at the given distance (radius) from it's center.
//source: http://www.mathhelpforum.com/math-help/geometry/136011-circle-involute-solving-y-any-given-x.html

function involute_intersect_angle (base_radius, radius) = sqrt (pow (radius/base_radius, 2) - 1) * 180 / pi;

// Calculate the involute position for a given base radius and involute angle.

function rotated_involute (rotate, base_radius, involute_angle) = 
[
	cos (rotate) * involute (base_radius, involute_angle)[0] + sin (rotate) * involute (base_radius, involute_angle)[1],
	cos (rotate) * involute (base_radius, involute_angle)[1] - sin (rotate) * involute (base_radius, involute_angle)[0]
];

function mirror_point (coord) = 
[
	coord[0], 
	-coord[1]
];

function rotate_point (rotate, coord) =
[
	cos (rotate) * coord[0] + sin (rotate) * coord[1],
	cos (rotate) * coord[1] - sin (rotate) * coord[0]
];

function involute (base_radius, involute_angle) = 
[
	base_radius*(cos (involute_angle) + involute_angle*pi/180*sin (involute_angle)),
	base_radius*(sin (involute_angle) - involute_angle*pi/180*cos (involute_angle)),
];


// Test Cases
//===============

module test_gears()
{
	translate([17,-15])
	{
		gear (number_of_teeth=17,
			circular_pitch=500,
			circles=8);
	
		rotate ([0,0,360*4/17])
		translate ([39.088888,0,0])
		{
			gear (number_of_teeth=11,
				circular_pitch=500,
				hub_diameter=0,
				rim_width=65);
			translate ([0,0,8])
			{
				gear (number_of_teeth=6,
					circular_pitch=300,
					hub_diameter=0,
					rim_width=5,
					rim_thickness=6,
					pressure_angle=31);
				rotate ([0,0,360*5/6])
				translate ([22.5,0,1])
				gear (number_of_teeth=21,
					circular_pitch=300,
					bore_diameter=2,
					hub_diameter=4,
					rim_width=1,
					hub_thickness=4,
					rim_thickness=4,
					gear_thickness=3,
					pressure_angle=31);
			}
		}

		translate ([-61.1111111,0,0])
		{
			gear (number_of_teeth=27,
				circular_pitch=500,
				circles=5,
				hub_diameter=2*8.88888889);

			translate ([0,0,10])
			{
				gear (
					number_of_teeth=14,
					circular_pitch=200,
					pressure_angle=5,
					clearance = 0.2,
					gear_thickness = 10,
					rim_thickness = 10,
					rim_width = 15,
					bore_diameter=5,
					circles=0);
				translate ([13.8888888,0,1])
				gear (
					number_of_teeth=11,
					circular_pitch=200,
					pressure_angle=5,
					clearance = 0.2,
					gear_thickness = 10,
					rim_thickness = 10,
					rim_width = 15,
					hub_thickness = 20,
					hub_diameter=2*7.222222,
					bore_diameter=5,
					circles=0);
			}
		}
	
		rotate ([0,0,360*-5/17])
		translate ([44.444444444,0,0])
		gear (number_of_teeth=15,
			circular_pitch=500,
			hub_diameter=10,
			rim_width=5,
			rim_thickness=5,
			gear_thickness=4,
			hub_thickness=6,
			circles=9);
	
		rotate ([0,0,360*-1/17])
		translate ([30.5555555,0,-1])
		gear (number_of_teeth=5,
			circular_pitch=500,
			hub_diameter=0,
			rim_width=5,
			rim_thickness=10);
	}
}

module meshing_double_helix ()
{
	test_double_helix_gear ();
	
	mirror ([0,1,0])
	translate ([58.33333333,0,0])
	test_double_helix_gear (teeth=13,circles=6);
}

module test_double_helix_gear (
	teeth=17,
	circles=8)
{
	//double helical gear
	{
		twist=200;
		height=20;
		pressure_angle=30;

		gear (number_of_teeth=teeth,
			circular_pitch=700,
			pressure_angle=pressure_angle,
			clearance = 0.2,
			gear_thickness = height/2*0.5,
			rim_thickness = height/2,
			rim_width = 5,
			hub_thickness = height/2*1.2,
			hub_diameter=15,
			bore_diameter=5,
			circles=circles,
			twist=twist/teeth);
		mirror([0,0,1])
		gear (number_of_teeth=teeth,
			circular_pitch=700,
			pressure_angle=pressure_angle,
			clearance = 0.2,
			gear_thickness = height/2,
			rim_thickness = height/2,
			rim_width = 5,
			hub_thickness = height/2,
			hub_diameter=15,
			bore_diameter=5,
			circles=circles,
			twist=twist/teeth);
	}
}

module test_backlash ()
{
	backlash = 2;
	teeth = 15;

	translate ([-29.166666,0,0])
	{
		translate ([58.3333333,0,0])
		rotate ([0,0,-360/teeth/4])
		gear (
			number_of_teeth = teeth,
			circular_pitch=700,
			gear_thickness = 12,
			rim_thickness = 15,
			rim_width = 5,
			hub_thickness = 17,
			hub_diameter=15,
			bore_diameter=5,
			backlash = 2,
			circles=8);
		
		rotate ([0,0,360/teeth/4])
		gear (
			number_of_teeth = teeth,
			circular_pitch=700,
			gear_thickness = 12,
			rim_thickness = 15,
			rim_width = 5,
			hub_thickness = 17,
			hub_diameter=15,
			bore_diameter=5,
			backlash = 2,
			circles=8);
	}

	color([0,0,128,0.5])
	translate([0,0,-5])
	cylinder ($fn=20,r=backlash / 4,h=25);
}
